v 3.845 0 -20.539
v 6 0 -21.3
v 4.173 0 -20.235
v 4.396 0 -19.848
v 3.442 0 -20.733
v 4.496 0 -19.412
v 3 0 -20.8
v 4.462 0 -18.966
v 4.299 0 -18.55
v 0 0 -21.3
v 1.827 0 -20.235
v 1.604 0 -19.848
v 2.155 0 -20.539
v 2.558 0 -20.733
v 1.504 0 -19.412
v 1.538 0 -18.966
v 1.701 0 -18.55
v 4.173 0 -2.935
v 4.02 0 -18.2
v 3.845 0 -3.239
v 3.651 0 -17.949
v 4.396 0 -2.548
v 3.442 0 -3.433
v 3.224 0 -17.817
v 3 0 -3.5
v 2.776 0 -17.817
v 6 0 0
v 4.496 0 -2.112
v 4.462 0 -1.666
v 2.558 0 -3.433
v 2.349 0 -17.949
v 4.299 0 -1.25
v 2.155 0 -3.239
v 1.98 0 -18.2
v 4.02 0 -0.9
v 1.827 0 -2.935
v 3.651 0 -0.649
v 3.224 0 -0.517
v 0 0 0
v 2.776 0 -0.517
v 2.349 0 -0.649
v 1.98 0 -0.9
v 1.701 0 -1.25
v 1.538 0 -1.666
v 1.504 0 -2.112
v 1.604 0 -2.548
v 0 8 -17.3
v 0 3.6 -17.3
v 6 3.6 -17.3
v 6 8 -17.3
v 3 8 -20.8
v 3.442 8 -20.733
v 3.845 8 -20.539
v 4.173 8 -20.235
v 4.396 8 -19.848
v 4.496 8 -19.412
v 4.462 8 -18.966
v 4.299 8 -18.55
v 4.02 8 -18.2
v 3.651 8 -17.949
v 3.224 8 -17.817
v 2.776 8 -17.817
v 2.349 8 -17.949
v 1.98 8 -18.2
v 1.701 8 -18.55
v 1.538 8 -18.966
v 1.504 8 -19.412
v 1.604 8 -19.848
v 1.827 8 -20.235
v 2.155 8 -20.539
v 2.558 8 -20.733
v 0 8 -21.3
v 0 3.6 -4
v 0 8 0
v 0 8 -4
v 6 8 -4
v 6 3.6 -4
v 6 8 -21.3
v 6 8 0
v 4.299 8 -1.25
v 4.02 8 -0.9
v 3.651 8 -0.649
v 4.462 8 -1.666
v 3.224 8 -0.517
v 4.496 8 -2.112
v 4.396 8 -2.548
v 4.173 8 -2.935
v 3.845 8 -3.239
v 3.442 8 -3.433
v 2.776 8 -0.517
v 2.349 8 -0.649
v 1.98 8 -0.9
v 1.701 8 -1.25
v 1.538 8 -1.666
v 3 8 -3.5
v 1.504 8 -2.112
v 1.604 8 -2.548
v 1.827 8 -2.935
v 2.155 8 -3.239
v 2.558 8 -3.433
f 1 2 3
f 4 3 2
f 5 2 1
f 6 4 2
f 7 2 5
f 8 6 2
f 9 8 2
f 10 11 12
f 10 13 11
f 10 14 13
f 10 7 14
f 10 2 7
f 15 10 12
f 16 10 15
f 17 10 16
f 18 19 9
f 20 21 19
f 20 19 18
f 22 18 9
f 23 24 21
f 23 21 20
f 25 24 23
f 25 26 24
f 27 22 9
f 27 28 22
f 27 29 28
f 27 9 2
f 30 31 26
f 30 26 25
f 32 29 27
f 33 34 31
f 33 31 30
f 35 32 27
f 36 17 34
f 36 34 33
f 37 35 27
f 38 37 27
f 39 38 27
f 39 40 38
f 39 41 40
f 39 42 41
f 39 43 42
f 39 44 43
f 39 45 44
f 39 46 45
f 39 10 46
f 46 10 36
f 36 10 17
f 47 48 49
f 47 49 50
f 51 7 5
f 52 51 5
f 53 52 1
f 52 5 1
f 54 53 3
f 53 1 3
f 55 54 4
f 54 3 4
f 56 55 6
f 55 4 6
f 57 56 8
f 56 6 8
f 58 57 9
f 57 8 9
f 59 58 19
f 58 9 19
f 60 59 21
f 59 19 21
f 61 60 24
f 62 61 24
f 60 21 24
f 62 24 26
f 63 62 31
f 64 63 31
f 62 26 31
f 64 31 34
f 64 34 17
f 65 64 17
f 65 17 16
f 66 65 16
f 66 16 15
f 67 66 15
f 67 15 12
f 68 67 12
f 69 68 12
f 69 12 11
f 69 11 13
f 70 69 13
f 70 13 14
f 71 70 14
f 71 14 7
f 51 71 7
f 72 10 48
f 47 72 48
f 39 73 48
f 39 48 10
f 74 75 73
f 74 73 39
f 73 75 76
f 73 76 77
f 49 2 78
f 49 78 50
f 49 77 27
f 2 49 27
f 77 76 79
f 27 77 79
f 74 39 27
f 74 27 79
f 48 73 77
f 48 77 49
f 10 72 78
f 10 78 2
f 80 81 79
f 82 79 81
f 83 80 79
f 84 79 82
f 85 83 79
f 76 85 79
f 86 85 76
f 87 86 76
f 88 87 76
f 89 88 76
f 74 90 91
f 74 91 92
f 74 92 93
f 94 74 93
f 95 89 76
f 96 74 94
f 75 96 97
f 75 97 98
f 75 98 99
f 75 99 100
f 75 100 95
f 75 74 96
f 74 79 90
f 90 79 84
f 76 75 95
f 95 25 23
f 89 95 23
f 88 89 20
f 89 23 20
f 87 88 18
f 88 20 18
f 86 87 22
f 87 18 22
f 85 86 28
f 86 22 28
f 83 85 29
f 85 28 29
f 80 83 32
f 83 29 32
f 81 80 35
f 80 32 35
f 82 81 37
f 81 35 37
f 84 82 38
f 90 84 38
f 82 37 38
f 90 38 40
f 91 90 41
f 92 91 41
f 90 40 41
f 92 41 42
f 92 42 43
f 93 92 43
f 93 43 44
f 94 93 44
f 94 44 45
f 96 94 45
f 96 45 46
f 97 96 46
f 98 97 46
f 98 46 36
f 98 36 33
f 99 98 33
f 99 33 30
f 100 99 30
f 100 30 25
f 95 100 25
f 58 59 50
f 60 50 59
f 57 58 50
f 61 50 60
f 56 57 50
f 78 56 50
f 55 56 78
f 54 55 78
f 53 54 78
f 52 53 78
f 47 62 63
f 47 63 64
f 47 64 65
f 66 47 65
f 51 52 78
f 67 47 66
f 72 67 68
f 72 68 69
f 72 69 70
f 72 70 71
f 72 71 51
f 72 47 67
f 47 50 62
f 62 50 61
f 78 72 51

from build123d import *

# Parameters (mm, degrees)
EXTRUDE_1_DEPTH  = 6
MM_CLEARANCE_1_D = 3


with BuildPart() as part:
    # 草图1 → 凸台-拉伸1 (new body)
    with BuildSketch(Plane(origin=(0, 0, 0), x_dir=(0, 0, -1), z_dir=(1, 0, 0))):
        Polygon((0, 0), (0, 8), (4, 8), (4, 3.6), (17.3, 3.6), (17.3, 8), (21.3, 8), (21.3, 0), align=None)
    extrude(amount=EXTRUDE_1_DEPTH)

    # 大小mm Clearance 暗销孔1 (through all)
    with Locations(Plane(origin=(3, 8, -2), x_dir=(0, 0, 1), z_dir=(0, 1, 0))):
        with Locations((0, 0), (-17.3, 0)):
            Hole(MM_CLEARANCE_1_D / 2)


solid = part.part
